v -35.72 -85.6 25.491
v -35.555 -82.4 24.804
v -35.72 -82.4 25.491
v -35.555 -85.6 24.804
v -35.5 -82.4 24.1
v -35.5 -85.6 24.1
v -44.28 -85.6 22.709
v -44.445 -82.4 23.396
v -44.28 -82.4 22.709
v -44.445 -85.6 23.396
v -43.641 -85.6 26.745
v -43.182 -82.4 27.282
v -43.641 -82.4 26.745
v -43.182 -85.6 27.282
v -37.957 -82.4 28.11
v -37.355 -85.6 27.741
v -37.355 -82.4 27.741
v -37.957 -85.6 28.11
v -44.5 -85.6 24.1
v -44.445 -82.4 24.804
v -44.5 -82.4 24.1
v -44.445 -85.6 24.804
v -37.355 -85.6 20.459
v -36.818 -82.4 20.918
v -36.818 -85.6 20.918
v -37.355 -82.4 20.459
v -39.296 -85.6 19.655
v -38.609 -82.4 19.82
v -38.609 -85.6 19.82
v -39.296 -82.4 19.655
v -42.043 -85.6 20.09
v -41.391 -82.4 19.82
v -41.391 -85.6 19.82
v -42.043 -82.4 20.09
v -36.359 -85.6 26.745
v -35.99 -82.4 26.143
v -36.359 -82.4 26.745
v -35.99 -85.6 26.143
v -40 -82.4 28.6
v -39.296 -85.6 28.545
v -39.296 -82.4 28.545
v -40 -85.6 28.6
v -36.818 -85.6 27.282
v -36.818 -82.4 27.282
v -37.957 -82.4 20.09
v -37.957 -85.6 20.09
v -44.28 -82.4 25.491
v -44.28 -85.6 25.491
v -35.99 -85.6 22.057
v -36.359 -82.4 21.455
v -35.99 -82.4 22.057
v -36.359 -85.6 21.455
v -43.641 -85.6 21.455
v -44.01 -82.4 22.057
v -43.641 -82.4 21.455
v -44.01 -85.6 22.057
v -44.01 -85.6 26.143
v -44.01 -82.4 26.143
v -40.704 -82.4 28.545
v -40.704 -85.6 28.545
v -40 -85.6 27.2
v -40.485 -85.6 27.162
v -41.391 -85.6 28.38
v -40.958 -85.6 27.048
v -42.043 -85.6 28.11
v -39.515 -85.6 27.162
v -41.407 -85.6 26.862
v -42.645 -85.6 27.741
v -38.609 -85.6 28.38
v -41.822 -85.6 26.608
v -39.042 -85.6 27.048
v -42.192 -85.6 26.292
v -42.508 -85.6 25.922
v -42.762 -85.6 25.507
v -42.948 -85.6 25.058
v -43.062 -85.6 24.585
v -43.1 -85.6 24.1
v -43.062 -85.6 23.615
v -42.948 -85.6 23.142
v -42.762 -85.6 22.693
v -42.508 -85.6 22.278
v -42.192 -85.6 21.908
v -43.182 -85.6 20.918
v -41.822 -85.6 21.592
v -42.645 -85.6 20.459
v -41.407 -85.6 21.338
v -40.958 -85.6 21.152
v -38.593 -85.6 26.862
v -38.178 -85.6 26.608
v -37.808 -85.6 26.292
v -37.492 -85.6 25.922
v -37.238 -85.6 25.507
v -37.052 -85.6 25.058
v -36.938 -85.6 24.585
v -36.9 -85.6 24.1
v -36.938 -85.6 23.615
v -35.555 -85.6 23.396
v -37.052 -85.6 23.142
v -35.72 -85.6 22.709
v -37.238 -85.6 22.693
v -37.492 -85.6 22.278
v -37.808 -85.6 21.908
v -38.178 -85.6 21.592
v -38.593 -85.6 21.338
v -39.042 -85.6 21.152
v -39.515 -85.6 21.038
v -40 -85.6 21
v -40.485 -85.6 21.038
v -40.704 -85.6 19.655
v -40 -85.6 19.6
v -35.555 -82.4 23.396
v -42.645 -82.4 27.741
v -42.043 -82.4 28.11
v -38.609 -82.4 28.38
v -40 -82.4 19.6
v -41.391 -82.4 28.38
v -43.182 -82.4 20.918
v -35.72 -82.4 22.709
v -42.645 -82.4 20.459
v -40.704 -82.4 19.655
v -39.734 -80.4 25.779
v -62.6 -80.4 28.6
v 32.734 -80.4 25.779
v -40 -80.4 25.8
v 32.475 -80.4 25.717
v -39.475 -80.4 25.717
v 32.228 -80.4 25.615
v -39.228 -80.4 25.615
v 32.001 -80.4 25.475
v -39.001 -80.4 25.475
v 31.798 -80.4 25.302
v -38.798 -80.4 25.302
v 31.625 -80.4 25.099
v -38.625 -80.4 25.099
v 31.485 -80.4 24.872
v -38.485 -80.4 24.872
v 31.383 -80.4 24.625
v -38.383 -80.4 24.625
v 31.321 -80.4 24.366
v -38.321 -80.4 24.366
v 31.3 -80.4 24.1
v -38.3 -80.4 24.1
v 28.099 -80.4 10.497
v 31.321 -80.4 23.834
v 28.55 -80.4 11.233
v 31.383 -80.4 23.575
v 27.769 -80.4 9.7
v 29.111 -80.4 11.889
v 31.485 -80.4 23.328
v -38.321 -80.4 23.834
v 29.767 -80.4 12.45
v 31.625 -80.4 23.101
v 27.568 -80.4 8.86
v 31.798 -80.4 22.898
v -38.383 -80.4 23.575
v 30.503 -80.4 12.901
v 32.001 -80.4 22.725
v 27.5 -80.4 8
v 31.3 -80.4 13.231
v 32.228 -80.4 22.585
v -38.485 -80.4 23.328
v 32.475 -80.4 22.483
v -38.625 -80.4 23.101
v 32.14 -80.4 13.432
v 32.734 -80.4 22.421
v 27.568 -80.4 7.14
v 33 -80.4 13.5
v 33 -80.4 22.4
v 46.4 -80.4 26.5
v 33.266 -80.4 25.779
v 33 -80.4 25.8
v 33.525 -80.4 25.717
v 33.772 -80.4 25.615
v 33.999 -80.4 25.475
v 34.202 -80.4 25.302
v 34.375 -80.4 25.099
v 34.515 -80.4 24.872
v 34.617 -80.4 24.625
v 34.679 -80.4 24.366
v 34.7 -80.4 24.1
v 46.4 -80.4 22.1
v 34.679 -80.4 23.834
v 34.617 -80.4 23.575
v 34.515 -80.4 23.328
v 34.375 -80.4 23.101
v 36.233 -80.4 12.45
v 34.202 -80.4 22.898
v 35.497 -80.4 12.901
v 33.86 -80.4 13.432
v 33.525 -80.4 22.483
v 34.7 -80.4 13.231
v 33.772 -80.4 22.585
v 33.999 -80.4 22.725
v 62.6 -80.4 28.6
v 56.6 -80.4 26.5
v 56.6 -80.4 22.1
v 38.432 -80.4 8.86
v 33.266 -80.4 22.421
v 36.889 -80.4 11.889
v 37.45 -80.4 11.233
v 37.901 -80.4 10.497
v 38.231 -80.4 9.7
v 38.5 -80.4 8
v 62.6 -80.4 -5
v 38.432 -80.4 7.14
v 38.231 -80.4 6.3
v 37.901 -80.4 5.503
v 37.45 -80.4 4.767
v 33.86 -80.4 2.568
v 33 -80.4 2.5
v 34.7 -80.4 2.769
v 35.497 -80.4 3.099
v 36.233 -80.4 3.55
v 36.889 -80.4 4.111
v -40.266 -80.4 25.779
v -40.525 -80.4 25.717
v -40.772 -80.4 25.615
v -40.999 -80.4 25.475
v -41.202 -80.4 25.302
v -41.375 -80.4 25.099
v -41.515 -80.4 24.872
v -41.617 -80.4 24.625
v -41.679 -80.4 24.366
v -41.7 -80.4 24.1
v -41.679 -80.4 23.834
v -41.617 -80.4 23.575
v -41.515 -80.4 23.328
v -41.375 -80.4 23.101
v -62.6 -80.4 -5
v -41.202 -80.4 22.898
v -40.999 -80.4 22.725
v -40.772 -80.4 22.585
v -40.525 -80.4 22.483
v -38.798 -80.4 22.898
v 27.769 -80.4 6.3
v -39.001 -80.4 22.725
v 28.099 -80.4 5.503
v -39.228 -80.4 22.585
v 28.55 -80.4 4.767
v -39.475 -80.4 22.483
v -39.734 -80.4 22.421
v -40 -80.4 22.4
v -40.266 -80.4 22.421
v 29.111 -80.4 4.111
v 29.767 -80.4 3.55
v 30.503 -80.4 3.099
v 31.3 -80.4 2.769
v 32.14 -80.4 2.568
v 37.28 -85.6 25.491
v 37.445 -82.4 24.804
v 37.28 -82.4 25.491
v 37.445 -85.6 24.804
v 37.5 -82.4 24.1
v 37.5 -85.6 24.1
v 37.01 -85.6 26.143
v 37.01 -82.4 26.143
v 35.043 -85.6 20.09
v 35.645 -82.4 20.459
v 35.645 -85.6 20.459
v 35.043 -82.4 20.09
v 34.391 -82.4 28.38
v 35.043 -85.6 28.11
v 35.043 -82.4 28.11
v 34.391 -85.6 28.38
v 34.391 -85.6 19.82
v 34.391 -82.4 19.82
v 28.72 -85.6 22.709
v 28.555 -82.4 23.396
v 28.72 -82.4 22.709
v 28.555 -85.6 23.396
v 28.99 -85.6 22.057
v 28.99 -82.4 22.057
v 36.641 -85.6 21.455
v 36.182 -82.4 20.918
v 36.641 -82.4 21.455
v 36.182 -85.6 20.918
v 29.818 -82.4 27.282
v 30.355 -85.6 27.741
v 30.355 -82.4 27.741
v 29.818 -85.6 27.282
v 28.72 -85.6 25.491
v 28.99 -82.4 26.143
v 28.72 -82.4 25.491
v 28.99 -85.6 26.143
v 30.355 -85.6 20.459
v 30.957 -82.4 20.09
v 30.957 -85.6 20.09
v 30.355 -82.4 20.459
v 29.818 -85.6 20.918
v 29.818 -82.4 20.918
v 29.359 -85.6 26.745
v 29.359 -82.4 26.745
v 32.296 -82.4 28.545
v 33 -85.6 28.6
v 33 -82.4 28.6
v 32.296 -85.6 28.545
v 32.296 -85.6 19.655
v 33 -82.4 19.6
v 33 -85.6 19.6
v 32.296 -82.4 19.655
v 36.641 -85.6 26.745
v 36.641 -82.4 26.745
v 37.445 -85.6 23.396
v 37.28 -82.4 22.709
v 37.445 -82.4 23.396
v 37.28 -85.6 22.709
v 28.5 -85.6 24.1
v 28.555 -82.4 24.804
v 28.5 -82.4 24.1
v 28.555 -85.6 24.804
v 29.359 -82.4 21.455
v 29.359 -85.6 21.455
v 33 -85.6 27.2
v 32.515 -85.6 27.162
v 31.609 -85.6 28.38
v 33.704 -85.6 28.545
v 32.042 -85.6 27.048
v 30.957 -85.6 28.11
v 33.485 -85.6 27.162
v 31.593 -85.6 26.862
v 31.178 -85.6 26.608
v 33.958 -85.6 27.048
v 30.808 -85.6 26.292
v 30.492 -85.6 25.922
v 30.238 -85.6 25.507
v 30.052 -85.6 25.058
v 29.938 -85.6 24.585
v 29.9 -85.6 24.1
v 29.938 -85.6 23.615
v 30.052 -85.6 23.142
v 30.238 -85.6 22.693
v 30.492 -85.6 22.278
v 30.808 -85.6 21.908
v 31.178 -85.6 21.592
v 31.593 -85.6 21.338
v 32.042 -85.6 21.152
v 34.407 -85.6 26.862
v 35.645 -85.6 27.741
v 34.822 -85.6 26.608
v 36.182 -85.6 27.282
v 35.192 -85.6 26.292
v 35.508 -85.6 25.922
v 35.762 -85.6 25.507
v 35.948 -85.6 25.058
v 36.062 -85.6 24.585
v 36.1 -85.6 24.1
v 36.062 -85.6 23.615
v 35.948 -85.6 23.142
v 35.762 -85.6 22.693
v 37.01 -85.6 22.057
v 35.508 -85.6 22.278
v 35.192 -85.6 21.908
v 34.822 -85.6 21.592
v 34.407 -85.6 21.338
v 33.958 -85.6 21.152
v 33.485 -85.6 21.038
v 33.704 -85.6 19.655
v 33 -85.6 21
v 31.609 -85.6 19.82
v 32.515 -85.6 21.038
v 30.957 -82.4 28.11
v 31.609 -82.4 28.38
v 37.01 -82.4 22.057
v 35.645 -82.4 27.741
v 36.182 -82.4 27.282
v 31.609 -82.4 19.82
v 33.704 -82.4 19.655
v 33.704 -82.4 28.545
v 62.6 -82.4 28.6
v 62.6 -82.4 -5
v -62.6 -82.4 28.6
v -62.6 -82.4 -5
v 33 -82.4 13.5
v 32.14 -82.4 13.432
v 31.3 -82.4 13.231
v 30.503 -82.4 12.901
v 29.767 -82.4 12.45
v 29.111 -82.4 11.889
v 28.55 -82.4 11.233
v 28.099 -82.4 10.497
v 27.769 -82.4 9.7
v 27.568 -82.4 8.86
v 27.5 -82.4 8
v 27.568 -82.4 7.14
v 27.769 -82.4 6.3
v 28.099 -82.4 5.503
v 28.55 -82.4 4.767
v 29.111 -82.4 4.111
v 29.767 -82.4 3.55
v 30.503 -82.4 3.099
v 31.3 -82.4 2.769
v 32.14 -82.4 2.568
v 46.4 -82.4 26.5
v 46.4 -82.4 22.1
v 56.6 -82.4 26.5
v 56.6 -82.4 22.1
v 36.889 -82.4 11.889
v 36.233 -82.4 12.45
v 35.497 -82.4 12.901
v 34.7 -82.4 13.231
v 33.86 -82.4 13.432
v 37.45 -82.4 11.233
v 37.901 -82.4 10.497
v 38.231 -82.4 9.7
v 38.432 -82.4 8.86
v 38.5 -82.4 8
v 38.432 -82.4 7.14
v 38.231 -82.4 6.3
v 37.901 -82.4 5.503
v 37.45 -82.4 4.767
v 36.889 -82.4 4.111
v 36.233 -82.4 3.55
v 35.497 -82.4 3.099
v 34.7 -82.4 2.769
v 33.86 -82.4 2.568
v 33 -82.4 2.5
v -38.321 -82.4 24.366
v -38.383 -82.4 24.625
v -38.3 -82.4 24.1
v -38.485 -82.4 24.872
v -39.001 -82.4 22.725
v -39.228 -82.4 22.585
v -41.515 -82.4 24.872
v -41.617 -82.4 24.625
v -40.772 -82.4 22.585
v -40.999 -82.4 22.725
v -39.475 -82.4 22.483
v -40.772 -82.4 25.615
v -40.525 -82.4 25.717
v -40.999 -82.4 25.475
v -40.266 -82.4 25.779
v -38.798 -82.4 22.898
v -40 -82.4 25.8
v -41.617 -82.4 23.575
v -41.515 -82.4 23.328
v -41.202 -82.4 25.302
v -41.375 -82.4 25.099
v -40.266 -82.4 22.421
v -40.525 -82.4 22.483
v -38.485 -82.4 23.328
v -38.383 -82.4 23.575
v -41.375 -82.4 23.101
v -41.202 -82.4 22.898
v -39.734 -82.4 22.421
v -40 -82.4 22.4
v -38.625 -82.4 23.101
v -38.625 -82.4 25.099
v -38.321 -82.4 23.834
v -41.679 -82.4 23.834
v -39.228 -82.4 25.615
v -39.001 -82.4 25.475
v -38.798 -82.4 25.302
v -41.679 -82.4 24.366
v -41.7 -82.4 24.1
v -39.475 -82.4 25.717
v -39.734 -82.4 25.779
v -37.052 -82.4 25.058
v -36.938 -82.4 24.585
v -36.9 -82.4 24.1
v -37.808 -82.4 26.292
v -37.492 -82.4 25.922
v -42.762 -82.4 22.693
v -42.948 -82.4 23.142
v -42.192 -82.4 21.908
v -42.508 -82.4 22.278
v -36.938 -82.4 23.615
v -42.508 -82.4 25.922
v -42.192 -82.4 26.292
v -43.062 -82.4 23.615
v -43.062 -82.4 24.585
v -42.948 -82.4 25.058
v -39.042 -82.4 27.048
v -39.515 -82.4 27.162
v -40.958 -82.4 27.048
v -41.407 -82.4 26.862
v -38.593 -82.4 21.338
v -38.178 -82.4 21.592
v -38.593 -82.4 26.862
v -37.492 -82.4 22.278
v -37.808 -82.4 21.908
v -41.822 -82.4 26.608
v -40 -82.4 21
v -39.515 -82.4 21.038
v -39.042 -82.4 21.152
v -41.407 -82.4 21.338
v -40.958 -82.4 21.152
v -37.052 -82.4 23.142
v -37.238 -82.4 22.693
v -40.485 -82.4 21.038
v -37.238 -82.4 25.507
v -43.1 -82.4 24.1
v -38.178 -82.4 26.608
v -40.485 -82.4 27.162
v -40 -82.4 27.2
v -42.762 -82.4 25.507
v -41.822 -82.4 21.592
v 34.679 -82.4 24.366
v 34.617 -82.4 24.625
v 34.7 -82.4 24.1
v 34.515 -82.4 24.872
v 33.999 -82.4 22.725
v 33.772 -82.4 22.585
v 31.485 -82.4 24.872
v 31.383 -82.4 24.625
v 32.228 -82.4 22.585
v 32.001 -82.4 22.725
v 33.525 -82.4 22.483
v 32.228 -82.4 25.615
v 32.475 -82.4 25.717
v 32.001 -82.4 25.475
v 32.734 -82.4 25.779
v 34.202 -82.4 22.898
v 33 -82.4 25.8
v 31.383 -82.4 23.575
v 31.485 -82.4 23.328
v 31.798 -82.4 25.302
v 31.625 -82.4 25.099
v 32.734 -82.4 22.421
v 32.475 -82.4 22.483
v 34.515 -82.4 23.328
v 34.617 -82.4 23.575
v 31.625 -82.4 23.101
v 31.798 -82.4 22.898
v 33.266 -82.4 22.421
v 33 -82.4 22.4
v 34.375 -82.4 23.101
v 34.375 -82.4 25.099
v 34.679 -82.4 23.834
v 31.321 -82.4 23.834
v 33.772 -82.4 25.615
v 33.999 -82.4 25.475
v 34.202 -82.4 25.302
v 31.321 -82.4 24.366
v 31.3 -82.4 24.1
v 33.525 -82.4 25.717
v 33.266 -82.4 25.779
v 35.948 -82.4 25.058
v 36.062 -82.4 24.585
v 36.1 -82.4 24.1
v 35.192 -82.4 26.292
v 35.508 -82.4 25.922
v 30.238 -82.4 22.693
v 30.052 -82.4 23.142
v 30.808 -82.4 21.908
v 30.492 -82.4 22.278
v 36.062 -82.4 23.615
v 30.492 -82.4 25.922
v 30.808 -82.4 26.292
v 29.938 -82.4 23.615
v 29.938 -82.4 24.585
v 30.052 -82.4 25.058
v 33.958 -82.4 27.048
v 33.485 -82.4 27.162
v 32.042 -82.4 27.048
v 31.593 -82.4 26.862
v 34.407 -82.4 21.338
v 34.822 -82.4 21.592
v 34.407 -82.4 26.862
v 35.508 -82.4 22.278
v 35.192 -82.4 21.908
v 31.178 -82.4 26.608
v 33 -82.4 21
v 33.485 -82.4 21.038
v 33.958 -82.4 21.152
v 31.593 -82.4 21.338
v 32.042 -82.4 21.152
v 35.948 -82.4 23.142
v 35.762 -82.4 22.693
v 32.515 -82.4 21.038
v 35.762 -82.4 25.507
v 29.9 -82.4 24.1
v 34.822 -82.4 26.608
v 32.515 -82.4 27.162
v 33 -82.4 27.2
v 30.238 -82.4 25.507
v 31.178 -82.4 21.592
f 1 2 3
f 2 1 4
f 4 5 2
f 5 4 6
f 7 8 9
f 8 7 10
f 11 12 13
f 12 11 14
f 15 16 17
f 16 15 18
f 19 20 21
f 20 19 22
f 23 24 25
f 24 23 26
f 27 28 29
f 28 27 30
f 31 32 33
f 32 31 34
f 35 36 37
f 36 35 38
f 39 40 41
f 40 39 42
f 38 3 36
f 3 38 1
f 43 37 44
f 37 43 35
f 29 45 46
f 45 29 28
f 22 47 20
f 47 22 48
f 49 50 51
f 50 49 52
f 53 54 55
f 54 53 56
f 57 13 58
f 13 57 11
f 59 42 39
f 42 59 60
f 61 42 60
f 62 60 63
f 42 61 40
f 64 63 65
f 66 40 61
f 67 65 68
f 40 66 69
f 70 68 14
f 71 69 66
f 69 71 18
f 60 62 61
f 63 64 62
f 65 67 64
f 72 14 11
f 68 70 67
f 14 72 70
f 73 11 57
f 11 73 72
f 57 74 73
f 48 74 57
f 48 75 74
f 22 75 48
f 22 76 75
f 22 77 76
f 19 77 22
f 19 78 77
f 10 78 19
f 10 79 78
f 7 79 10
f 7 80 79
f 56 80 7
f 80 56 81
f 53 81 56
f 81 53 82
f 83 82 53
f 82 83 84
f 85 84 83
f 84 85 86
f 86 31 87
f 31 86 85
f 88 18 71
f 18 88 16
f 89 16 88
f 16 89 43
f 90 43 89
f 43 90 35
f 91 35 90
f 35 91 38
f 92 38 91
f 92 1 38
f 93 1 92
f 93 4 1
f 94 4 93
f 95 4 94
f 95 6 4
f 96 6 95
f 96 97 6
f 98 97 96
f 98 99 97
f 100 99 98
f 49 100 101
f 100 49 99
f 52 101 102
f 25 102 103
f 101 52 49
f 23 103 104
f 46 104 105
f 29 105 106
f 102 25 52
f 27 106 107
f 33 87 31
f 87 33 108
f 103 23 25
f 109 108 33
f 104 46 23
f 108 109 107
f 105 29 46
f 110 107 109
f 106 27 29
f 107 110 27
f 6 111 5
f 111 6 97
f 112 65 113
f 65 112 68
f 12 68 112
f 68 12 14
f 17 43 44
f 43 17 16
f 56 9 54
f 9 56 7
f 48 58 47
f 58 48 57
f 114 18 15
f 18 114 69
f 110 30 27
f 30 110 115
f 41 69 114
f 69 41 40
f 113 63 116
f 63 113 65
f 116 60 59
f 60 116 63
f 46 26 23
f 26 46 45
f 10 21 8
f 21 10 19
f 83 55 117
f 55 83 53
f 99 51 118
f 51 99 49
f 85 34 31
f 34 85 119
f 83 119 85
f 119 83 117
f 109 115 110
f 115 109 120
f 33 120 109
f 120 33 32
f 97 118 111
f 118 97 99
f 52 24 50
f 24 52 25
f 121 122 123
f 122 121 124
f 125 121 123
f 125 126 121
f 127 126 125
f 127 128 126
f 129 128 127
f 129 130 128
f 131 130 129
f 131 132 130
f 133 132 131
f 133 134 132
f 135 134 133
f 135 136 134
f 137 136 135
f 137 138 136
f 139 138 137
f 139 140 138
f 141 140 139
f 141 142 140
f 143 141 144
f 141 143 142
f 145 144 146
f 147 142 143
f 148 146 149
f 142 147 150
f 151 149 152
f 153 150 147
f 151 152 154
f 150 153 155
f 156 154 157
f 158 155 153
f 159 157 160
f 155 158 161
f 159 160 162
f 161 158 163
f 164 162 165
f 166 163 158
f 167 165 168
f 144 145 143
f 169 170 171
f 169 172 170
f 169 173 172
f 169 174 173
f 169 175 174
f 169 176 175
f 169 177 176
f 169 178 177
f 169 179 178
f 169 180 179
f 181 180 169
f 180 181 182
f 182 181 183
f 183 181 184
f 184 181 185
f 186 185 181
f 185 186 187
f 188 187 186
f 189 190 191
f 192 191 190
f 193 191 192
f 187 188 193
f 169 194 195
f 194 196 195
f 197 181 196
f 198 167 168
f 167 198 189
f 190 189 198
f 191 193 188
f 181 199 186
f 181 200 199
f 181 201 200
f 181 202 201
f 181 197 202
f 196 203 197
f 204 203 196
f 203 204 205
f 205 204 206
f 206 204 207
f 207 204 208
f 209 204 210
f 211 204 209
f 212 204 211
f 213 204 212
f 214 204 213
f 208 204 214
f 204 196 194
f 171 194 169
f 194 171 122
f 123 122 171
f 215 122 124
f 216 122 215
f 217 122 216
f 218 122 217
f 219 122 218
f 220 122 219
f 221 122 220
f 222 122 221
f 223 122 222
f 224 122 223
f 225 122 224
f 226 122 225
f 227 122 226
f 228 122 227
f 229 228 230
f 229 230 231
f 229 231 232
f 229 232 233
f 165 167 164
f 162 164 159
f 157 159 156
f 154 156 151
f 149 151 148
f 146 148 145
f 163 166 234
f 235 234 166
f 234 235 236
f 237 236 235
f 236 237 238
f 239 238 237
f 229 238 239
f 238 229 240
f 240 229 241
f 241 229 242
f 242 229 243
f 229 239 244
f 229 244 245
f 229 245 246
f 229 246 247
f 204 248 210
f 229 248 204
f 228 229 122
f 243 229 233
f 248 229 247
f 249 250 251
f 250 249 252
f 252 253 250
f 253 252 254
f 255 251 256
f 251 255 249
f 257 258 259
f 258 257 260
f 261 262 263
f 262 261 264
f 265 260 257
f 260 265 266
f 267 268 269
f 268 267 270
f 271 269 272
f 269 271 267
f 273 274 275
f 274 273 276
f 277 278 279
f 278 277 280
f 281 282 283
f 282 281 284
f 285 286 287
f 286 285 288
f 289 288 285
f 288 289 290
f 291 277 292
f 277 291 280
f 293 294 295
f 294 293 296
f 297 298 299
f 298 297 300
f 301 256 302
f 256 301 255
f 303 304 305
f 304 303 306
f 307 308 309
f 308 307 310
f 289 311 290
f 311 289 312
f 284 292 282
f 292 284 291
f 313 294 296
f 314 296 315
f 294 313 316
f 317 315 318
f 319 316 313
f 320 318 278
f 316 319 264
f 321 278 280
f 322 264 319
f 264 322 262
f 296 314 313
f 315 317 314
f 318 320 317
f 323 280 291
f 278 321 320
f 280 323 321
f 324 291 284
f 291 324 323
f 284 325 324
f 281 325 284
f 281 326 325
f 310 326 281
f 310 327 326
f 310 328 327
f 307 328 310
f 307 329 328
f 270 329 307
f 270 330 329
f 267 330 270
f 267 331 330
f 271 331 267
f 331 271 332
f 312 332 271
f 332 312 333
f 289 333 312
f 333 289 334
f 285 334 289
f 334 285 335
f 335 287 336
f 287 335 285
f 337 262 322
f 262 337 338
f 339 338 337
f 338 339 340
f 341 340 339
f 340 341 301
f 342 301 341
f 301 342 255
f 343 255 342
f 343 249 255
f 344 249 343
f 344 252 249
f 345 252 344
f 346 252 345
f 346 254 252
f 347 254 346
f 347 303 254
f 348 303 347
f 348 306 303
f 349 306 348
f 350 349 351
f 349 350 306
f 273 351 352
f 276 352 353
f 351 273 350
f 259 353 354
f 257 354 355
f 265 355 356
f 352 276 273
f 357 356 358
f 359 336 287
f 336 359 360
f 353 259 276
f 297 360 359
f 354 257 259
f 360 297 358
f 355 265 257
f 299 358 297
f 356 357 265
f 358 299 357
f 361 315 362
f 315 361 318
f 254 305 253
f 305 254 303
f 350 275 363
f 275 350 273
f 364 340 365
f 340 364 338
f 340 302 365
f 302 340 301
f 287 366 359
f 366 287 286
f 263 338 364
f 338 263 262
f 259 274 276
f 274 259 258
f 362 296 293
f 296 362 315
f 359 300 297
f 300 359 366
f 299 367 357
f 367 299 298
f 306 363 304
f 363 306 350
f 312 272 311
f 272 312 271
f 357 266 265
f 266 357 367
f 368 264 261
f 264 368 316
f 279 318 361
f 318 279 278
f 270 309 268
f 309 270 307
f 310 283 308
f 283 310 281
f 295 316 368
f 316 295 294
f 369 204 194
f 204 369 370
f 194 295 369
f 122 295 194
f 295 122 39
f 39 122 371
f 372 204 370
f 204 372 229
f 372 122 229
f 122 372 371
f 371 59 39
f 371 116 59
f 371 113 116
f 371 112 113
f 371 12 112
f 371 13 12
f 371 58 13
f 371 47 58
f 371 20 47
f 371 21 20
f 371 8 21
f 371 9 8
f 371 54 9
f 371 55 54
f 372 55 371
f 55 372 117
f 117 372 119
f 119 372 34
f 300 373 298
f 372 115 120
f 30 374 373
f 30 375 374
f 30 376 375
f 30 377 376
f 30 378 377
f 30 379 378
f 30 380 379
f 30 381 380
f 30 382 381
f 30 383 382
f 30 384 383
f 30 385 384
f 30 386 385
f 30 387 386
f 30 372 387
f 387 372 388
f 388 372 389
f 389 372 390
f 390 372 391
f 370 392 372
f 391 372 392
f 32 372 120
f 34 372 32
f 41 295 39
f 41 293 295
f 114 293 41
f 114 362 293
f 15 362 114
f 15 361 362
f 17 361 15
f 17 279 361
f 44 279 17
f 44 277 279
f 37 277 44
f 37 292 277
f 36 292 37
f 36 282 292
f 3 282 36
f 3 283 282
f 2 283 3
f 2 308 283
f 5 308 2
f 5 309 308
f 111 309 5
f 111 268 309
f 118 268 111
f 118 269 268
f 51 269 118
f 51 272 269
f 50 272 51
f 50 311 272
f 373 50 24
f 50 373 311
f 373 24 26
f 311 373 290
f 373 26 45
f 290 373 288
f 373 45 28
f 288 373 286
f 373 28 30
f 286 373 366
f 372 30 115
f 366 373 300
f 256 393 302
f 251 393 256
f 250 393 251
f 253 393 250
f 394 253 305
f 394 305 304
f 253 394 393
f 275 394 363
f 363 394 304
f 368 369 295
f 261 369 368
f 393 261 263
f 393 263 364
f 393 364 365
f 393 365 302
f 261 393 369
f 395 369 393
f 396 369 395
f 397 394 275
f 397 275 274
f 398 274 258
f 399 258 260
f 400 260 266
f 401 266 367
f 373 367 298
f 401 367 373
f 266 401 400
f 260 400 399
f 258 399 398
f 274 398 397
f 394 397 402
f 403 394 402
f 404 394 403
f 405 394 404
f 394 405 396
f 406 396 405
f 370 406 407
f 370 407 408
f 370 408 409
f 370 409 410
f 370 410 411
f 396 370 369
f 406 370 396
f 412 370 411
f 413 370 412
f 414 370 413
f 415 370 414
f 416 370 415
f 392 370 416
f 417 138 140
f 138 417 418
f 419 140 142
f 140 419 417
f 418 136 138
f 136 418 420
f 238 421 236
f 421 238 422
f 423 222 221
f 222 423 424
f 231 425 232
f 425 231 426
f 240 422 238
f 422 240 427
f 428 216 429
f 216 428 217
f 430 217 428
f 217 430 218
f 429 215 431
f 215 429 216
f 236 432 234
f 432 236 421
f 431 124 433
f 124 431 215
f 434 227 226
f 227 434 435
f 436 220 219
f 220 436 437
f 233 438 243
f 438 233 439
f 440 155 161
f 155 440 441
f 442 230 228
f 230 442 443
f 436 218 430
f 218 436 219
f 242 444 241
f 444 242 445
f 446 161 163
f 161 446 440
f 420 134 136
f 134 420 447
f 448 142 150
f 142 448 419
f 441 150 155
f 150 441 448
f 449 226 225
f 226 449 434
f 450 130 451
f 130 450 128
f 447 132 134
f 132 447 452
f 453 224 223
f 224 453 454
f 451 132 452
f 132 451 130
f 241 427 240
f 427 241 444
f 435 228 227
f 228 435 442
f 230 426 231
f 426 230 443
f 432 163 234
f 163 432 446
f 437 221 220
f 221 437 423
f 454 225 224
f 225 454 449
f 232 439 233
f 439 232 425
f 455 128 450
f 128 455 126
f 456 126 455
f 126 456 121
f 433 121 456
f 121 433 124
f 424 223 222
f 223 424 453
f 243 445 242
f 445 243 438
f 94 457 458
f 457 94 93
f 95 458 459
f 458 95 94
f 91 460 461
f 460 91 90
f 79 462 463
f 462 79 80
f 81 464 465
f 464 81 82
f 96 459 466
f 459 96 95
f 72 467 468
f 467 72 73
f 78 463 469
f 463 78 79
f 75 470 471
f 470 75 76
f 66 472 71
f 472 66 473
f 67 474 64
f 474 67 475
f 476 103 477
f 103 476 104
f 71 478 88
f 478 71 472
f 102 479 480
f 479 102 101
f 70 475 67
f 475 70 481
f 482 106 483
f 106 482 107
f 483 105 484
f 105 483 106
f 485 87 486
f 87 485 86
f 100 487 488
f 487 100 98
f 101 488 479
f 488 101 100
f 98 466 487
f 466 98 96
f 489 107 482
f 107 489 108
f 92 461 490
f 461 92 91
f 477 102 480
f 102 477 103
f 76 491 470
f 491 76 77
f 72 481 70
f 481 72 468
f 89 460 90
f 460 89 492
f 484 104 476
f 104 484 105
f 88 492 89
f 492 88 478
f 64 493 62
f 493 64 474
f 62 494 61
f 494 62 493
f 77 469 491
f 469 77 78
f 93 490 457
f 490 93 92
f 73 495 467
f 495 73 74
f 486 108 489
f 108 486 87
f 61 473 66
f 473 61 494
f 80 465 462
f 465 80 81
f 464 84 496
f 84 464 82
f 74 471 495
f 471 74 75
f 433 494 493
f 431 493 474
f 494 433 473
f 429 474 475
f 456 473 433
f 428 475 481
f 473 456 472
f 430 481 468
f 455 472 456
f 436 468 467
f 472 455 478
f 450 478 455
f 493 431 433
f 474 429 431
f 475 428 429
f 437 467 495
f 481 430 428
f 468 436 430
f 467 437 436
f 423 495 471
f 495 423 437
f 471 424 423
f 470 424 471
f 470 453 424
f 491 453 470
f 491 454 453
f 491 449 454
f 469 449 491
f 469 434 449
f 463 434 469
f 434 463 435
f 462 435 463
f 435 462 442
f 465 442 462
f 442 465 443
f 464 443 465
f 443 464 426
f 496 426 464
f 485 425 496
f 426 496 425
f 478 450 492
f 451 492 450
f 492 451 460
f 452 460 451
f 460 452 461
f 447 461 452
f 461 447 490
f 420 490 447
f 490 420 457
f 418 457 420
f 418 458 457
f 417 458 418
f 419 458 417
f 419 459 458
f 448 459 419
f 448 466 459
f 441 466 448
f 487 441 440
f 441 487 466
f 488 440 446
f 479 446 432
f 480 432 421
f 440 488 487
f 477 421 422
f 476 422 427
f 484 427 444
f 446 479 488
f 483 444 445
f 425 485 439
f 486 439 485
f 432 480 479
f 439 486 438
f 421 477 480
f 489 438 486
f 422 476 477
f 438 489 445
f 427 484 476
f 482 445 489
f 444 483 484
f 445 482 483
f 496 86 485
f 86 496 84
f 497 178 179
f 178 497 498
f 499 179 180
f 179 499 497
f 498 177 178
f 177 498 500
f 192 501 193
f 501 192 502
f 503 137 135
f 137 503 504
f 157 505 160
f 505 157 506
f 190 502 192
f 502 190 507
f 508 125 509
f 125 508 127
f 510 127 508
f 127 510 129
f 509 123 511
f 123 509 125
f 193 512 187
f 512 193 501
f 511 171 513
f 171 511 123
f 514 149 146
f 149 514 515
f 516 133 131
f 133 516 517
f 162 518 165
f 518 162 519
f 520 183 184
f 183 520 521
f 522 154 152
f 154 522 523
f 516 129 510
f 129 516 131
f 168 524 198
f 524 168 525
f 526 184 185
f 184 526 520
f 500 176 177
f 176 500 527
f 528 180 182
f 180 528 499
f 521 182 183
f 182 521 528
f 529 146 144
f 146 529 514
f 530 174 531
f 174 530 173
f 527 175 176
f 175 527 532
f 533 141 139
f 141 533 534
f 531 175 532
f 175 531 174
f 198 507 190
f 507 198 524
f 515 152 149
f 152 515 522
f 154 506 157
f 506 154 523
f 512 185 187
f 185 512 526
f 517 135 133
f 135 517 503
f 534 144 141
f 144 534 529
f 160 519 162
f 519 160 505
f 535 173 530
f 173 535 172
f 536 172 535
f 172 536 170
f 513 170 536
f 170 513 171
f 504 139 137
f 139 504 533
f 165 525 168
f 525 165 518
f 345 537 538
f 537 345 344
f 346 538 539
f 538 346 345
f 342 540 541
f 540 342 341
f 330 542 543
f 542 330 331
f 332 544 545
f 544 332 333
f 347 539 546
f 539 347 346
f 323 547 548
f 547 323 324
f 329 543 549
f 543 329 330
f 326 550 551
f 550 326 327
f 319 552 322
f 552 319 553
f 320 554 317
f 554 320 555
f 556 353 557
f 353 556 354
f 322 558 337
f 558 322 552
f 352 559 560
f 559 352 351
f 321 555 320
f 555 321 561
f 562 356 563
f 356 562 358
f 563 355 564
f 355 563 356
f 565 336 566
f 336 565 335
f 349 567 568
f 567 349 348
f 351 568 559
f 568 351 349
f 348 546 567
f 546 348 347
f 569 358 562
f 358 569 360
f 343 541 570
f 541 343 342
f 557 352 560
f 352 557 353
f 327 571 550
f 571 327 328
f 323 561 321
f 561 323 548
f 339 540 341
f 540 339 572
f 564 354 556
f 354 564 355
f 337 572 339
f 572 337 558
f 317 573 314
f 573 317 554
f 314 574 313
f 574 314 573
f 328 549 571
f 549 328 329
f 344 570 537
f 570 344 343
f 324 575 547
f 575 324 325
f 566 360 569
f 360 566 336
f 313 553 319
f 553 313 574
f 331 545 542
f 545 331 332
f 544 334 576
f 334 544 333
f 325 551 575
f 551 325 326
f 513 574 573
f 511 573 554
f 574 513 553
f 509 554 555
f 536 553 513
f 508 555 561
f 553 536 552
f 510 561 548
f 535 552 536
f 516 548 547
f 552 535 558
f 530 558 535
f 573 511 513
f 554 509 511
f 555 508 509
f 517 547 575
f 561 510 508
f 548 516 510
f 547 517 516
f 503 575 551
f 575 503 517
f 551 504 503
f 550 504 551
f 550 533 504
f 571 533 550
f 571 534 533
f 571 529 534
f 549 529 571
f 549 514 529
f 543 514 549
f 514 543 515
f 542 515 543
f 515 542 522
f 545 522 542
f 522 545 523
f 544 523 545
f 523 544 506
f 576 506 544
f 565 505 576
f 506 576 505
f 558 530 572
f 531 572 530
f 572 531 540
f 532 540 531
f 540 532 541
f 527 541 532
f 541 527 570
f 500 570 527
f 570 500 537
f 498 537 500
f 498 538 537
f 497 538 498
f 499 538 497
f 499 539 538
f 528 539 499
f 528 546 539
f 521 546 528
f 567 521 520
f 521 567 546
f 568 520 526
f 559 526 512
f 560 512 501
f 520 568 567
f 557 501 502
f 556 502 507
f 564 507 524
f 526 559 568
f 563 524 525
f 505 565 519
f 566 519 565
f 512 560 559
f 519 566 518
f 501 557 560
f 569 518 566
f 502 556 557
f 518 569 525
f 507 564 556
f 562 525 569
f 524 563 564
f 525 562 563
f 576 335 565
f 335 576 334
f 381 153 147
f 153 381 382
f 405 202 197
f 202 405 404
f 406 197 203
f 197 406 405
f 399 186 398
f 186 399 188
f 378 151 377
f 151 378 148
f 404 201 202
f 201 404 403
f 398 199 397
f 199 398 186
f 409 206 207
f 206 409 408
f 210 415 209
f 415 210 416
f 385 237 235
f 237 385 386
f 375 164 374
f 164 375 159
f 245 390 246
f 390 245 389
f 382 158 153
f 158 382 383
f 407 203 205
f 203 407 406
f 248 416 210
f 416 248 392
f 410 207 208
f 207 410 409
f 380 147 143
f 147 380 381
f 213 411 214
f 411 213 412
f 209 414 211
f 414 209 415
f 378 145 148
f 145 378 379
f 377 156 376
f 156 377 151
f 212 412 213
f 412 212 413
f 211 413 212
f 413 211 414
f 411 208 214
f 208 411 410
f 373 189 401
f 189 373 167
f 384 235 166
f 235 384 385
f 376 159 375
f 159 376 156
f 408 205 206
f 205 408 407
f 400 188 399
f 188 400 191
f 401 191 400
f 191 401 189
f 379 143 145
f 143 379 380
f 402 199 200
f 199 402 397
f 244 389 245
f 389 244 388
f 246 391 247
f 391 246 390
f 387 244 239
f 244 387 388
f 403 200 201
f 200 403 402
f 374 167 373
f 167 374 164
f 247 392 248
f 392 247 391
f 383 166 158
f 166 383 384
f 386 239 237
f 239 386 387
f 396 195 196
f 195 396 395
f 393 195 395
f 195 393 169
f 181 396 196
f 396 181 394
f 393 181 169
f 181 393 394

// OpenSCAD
include <../lib/hanging-solar-node-lib.scad>;
$fn = 40;
cover();
